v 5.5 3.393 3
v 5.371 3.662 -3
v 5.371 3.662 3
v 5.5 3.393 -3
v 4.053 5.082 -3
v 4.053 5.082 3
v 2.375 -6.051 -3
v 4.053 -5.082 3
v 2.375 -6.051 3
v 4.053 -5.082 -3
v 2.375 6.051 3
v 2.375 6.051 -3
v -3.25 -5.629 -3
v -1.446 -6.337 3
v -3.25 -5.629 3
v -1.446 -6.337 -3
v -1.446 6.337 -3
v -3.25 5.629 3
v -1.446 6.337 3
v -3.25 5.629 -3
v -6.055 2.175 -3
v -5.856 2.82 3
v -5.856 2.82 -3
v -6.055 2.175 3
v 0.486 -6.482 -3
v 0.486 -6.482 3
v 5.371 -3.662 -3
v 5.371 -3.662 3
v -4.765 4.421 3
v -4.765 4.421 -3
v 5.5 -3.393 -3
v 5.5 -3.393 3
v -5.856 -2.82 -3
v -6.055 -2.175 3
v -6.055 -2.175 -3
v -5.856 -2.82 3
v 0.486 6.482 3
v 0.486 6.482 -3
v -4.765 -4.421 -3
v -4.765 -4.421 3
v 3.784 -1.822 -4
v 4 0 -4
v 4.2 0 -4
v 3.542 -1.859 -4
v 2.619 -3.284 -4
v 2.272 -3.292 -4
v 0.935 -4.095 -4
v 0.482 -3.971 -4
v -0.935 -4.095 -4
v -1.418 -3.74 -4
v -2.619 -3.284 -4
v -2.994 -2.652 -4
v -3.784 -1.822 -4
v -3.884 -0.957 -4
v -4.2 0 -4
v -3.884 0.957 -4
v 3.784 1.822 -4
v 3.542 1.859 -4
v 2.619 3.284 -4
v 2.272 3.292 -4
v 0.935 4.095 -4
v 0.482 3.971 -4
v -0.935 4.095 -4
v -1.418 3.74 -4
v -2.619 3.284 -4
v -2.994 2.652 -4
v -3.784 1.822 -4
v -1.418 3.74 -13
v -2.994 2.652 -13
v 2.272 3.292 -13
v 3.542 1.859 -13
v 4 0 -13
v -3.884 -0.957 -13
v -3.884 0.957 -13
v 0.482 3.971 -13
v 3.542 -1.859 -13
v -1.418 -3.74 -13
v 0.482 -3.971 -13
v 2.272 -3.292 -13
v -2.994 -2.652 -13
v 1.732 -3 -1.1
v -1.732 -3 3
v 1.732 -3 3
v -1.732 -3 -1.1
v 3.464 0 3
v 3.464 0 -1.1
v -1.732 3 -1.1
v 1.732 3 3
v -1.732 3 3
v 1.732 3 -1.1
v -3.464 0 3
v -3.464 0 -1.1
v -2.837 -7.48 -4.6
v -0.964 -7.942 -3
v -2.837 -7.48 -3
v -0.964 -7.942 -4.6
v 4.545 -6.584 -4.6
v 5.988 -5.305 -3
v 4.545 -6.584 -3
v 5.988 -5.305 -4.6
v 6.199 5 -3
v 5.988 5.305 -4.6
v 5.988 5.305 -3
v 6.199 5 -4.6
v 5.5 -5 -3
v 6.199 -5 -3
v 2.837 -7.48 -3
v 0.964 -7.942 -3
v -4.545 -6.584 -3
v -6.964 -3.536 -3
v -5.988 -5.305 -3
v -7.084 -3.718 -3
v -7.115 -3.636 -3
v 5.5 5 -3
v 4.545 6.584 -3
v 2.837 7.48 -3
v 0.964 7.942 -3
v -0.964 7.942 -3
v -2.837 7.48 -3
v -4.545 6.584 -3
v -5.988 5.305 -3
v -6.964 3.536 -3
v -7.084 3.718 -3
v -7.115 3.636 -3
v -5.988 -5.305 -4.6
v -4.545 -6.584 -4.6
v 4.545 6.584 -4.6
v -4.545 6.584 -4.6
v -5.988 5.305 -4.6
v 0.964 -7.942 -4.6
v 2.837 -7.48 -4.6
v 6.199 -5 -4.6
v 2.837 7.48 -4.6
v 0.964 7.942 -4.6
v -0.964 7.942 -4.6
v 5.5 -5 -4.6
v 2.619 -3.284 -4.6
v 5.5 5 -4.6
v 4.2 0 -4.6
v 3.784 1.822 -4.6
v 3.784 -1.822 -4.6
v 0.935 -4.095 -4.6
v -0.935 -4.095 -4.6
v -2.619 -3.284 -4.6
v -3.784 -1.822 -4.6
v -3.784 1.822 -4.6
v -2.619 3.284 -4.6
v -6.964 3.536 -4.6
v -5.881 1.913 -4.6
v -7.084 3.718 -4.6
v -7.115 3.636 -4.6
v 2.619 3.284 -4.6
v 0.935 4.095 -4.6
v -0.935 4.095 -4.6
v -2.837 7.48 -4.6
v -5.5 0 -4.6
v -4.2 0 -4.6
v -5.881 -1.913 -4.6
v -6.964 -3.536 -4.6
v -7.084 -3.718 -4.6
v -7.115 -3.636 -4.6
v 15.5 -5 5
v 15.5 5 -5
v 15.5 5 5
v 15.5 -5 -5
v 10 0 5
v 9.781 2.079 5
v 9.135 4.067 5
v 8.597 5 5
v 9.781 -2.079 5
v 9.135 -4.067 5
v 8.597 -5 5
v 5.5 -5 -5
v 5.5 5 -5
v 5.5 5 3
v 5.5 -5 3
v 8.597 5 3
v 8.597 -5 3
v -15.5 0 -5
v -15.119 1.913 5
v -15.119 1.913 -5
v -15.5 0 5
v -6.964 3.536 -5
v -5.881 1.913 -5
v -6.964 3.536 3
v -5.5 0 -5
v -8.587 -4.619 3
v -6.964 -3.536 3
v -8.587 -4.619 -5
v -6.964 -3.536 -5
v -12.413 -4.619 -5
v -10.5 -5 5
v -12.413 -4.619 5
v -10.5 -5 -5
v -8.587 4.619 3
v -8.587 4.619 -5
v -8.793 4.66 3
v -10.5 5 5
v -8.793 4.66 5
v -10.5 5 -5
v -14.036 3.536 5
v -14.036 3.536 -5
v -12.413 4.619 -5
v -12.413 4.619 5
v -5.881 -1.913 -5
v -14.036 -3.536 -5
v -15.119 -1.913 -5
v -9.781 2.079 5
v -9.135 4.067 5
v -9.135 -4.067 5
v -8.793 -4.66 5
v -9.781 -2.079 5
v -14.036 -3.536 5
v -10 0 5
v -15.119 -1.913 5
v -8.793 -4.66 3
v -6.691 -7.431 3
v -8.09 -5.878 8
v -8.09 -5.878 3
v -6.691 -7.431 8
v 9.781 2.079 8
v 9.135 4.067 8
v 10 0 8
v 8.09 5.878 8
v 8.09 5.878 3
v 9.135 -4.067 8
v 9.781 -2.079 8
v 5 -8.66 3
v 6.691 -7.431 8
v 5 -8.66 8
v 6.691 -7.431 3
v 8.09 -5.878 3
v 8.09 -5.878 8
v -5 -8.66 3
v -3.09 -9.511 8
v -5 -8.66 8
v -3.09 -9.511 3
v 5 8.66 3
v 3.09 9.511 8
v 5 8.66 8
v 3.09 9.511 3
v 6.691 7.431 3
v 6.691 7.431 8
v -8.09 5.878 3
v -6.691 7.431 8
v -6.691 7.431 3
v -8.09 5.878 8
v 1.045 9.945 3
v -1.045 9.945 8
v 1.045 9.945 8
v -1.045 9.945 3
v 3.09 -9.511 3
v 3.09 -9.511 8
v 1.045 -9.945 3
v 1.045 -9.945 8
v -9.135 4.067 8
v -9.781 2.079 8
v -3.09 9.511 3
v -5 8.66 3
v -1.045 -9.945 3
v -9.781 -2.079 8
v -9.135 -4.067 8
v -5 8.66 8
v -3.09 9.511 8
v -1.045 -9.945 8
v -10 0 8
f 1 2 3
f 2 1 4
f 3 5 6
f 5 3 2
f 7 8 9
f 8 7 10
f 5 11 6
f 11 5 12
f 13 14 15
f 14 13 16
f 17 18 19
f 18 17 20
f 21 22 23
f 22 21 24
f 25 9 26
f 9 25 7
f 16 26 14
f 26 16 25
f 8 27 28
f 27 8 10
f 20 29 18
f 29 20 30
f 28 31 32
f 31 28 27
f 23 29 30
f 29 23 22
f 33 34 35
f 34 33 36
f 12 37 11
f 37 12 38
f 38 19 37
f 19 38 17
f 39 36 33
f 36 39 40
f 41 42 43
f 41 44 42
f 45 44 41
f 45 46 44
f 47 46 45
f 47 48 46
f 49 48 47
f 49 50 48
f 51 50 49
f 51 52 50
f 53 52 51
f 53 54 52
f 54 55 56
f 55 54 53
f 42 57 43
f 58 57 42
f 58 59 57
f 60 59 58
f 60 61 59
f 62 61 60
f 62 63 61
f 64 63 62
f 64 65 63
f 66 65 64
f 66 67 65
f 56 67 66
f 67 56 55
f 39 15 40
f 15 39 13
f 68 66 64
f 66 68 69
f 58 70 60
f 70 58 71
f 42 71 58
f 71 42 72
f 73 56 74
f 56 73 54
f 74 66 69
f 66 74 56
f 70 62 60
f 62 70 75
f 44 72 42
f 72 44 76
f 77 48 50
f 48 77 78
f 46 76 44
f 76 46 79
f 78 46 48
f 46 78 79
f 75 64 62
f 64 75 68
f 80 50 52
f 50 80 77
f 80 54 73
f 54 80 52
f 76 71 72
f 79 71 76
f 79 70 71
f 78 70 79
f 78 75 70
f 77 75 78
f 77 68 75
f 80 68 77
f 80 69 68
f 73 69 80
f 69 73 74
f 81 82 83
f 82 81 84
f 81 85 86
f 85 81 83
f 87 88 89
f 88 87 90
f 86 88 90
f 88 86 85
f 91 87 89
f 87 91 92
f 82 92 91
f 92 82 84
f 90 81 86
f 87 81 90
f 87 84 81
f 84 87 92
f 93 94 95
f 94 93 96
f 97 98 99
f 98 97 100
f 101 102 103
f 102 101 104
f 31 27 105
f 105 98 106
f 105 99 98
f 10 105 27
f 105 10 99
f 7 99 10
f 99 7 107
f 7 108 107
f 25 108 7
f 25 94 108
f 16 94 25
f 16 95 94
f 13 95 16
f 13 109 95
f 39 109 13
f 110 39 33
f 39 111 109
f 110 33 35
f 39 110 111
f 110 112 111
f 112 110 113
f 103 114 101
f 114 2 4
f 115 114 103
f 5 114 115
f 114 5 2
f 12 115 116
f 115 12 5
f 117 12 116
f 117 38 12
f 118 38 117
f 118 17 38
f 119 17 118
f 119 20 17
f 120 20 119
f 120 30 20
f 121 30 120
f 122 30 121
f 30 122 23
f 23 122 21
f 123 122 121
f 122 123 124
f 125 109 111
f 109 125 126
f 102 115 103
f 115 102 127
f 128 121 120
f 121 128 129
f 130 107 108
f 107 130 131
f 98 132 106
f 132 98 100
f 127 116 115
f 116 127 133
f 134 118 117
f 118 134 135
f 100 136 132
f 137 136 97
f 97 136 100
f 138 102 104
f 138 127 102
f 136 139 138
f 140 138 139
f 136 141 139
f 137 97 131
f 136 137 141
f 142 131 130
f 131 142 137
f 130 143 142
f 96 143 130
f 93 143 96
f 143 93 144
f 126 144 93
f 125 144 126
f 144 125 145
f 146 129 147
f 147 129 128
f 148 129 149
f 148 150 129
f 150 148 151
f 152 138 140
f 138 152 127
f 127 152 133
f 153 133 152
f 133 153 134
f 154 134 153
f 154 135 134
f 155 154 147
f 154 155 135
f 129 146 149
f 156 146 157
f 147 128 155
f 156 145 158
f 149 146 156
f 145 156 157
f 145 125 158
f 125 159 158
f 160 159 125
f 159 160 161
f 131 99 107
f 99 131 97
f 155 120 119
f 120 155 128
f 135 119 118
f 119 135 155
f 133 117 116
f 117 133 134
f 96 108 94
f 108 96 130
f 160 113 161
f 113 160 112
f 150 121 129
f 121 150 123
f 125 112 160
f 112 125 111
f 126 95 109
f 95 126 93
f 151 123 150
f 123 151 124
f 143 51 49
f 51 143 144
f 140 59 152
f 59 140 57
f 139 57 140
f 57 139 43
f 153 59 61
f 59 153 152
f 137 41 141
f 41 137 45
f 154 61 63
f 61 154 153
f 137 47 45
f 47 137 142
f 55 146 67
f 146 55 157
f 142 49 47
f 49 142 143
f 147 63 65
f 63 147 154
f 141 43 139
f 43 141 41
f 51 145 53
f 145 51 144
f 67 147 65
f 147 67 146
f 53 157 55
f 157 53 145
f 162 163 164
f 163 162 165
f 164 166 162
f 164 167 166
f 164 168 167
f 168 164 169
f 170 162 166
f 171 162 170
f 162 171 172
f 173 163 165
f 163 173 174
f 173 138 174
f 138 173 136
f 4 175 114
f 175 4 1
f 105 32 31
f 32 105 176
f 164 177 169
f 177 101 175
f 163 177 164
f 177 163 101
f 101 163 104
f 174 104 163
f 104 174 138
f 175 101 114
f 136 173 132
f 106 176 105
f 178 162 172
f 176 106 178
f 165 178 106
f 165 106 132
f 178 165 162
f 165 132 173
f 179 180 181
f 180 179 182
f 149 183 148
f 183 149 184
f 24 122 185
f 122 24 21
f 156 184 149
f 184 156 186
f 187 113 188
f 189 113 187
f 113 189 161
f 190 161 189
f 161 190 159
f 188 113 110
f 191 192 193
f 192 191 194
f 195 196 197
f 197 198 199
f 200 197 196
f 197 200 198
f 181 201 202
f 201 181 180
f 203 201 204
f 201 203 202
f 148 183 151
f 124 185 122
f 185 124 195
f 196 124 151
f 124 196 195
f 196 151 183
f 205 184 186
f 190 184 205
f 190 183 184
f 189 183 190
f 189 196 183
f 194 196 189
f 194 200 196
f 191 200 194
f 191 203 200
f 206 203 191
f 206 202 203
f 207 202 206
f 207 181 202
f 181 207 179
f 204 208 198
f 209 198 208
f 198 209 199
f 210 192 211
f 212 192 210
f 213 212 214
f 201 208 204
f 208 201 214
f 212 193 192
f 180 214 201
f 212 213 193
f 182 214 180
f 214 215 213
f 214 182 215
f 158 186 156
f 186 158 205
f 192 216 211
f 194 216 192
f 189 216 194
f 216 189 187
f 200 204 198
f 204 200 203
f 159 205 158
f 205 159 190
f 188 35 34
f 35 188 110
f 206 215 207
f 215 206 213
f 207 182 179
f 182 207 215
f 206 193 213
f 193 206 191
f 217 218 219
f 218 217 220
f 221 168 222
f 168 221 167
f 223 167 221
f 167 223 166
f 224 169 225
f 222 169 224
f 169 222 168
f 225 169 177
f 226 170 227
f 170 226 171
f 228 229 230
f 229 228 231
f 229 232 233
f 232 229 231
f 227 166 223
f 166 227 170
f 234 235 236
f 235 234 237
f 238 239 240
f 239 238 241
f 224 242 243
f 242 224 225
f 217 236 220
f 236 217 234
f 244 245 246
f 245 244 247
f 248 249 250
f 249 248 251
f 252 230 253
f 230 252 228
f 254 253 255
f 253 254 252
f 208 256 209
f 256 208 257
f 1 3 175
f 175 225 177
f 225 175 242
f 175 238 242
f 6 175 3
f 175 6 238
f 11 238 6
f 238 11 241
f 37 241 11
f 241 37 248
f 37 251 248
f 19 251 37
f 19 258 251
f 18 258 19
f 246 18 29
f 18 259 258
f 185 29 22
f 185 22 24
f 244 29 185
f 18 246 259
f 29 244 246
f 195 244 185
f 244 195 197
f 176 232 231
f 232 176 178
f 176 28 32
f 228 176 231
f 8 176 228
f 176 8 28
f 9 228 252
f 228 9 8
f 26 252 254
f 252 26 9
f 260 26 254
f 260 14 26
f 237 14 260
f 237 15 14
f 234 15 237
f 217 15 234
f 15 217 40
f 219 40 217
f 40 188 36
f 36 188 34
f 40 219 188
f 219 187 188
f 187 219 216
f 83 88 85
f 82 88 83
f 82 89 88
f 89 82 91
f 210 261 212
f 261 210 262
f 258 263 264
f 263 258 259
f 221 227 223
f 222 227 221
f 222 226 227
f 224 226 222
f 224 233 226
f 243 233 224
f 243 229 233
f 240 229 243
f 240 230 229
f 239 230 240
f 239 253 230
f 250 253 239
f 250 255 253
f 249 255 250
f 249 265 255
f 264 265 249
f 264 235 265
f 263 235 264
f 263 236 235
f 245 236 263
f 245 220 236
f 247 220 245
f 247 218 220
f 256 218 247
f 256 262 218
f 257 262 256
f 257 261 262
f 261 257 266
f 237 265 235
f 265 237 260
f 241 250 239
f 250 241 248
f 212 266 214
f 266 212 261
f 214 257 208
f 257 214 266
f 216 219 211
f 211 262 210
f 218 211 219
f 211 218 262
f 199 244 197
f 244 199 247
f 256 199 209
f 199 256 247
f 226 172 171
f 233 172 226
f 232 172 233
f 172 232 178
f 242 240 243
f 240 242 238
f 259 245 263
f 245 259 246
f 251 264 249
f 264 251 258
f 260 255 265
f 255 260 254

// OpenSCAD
// Parameters
shaft_diameter_mm = 8.0; //[4.0:16.0:0.1]
length_under_head_mm = 10.0; //[5.0:20.0:0.5]
head_diameter_mm = 13.0; //[6.5:26.0:0.1]
head_height_mm = 8.0; //[4.0:16.0:0.1]
socket_across_flats_mm = 6.0; //[3.0:12.0:0.1]
socket_depth_mm = 5.0; //[2.5:10.0:0.1]
under_head_chamfer_height_mm = 1.0; //[0.5:2.0:0.1]
shaft_end_chamfer_height_mm = 1.0; //[0.5:2.0:0.1]
overlap_mm = 1.0; //[0.5:2.0:0.1]
eps_mm = 0.2; //[0.05:0.5:0.05]
washer_outer_diameter_mm = 16.0; //[8.0:32.0:0.1]
washer_thickness_mm = 1.6; //[0.8:3.2:0.1]
washer_hole_diameter_mm = 8.4; //[4.2:16.8:0.1]
pin_socket_cutout_size_mm = 0.0; //[0.0:20.0:0.5]
pcb_spacer_cutout_size_mm = 0.0; //[0.0:30.0:0.5]
buzzer_cutout_size_mm = 0.0; //[0.0:50.0:0.5]

// Pin Socket - Placeholder geometry (kept, but attached)
module pin_socket() {
  cube([10, 10, 10], center=true);
}

// PCB Spacer - Placeholder geometry (kept, but attached)
module pcb_spacer() {
  cylinder(r=5, h=10, center=true);
}

// Buzzer - Placeholder geometry (kept, but attached)
module buzzer() {
  cylinder(r=10, h=5, center=true);
}

// Screw (single connected solid)
module screw() {

  head_r  = head_diameter_mm/2;
  shaft_r = shaft_diameter_mm/2;

  // Head is centered at z=0
  head_top_z    =  head_height_mm/2;
  head_bottom_z = -head_height_mm/2;

  // Shaft: ensure it overlaps into the under-head chamfer/head by overlap_mm
  shaft_top_z = head_bottom_z + overlap_mm;
  shaft_center_z = shaft_top_z - length_under_head_mm/2;

  // Under-head chamfer: spans from head_bottom_z down to head_bottom_z - under_head_chamfer_height_mm
  // Push it up by overlap_mm so it intersects the head slightly.
  chamfer_center_z = head_bottom_z - under_head_chamfer_height_mm/2 + overlap_mm;

  // Shaft end chamfer (the previously "floating frustum"): place it so its TOP overlaps the shaft bottom
  shaft_bottom_z = shaft_top_z - length_under_head_mm;
  end_chamfer_top_z = shaft_bottom_z + overlap_mm; // overlap into shaft
  end_chamfer_center_z = end_chamfer_top_z - shaft_end_chamfer_height_mm/2;

  // Washer: overlap into underside of head
  washer_center_z = head_bottom_z - washer_thickness_mm/2 + overlap_mm;

  // Attach placeholder parts with overlap into head
  block_size = [10, 10, 10];
  block_center_x = head_r + block_size[0]/2 - overlap_mm;
  block_center_z = 0;

  spacer_r = 5;
  spacer_center_x = -(head_r + spacer_r - overlap_mm);
  spacer_center_z = 0;

  buzzer_h = 5;
  buzzer_center_z = head_top_z + buzzer_h/2 - overlap_mm;

  union() {
    // Main screw body with socket cut
    difference() {
      union() {
        // Cap head
        cylinder(r=head_r, h=head_height_mm, center=true);

        // Shaft
        translate([0, 0, shaft_center_z])
          cylinder(r=shaft_r, h=length_under_head_mm, center=true);

        // Under-head chamfer
        translate([0, 0, chamfer_center_z])
          cylinder(r1=head_r, r2=shaft_r, h=under_head_chamfer_height_mm, center=true);

        // Shaft end chamfer / tip frustum (now physically attached via overlap)
        translate([0, 0, end_chamfer_center_z])
          cylinder(
            r1=shaft_r,
            r2=max(0.01, shaft_r - shaft_end_chamfer_height_mm),
            h=shaft_end_chamfer_height_mm,
            center=true
          );
      }

      // Hex socket cut into head
      translate([0, 0, head_top_z - socket_depth_mm/2])
        cylinder(
          r=socket_across_flats_mm/(2*cos(30)),
          h=socket_depth_mm + eps_mm,
          center=true,
          $fn=6
        );
    }

    // Washer (unioned; overlaps head)
    difference() {
      translate([0, 0, washer_center_z])
        cylinder(r=washer_outer_diameter_mm/2, h=washer_thickness_mm, center=true);
      translate([0, 0, washer_center_z])
        cylinder(r=washer_hole_diameter_mm/2, h=washer_thickness_mm + 2*eps_mm, center=true);
    }

    // Attached placeholder parts (kept connected)
    translate([block_center_x, 0, block_center_z]) pin_socket();
    translate([spacer_center_x, 0, spacer_center_z]) pcb_spacer();
    translate([0, 0, buzzer_center_z]) buzzer();
  }
}

// Output the expected part: screw
screw();
